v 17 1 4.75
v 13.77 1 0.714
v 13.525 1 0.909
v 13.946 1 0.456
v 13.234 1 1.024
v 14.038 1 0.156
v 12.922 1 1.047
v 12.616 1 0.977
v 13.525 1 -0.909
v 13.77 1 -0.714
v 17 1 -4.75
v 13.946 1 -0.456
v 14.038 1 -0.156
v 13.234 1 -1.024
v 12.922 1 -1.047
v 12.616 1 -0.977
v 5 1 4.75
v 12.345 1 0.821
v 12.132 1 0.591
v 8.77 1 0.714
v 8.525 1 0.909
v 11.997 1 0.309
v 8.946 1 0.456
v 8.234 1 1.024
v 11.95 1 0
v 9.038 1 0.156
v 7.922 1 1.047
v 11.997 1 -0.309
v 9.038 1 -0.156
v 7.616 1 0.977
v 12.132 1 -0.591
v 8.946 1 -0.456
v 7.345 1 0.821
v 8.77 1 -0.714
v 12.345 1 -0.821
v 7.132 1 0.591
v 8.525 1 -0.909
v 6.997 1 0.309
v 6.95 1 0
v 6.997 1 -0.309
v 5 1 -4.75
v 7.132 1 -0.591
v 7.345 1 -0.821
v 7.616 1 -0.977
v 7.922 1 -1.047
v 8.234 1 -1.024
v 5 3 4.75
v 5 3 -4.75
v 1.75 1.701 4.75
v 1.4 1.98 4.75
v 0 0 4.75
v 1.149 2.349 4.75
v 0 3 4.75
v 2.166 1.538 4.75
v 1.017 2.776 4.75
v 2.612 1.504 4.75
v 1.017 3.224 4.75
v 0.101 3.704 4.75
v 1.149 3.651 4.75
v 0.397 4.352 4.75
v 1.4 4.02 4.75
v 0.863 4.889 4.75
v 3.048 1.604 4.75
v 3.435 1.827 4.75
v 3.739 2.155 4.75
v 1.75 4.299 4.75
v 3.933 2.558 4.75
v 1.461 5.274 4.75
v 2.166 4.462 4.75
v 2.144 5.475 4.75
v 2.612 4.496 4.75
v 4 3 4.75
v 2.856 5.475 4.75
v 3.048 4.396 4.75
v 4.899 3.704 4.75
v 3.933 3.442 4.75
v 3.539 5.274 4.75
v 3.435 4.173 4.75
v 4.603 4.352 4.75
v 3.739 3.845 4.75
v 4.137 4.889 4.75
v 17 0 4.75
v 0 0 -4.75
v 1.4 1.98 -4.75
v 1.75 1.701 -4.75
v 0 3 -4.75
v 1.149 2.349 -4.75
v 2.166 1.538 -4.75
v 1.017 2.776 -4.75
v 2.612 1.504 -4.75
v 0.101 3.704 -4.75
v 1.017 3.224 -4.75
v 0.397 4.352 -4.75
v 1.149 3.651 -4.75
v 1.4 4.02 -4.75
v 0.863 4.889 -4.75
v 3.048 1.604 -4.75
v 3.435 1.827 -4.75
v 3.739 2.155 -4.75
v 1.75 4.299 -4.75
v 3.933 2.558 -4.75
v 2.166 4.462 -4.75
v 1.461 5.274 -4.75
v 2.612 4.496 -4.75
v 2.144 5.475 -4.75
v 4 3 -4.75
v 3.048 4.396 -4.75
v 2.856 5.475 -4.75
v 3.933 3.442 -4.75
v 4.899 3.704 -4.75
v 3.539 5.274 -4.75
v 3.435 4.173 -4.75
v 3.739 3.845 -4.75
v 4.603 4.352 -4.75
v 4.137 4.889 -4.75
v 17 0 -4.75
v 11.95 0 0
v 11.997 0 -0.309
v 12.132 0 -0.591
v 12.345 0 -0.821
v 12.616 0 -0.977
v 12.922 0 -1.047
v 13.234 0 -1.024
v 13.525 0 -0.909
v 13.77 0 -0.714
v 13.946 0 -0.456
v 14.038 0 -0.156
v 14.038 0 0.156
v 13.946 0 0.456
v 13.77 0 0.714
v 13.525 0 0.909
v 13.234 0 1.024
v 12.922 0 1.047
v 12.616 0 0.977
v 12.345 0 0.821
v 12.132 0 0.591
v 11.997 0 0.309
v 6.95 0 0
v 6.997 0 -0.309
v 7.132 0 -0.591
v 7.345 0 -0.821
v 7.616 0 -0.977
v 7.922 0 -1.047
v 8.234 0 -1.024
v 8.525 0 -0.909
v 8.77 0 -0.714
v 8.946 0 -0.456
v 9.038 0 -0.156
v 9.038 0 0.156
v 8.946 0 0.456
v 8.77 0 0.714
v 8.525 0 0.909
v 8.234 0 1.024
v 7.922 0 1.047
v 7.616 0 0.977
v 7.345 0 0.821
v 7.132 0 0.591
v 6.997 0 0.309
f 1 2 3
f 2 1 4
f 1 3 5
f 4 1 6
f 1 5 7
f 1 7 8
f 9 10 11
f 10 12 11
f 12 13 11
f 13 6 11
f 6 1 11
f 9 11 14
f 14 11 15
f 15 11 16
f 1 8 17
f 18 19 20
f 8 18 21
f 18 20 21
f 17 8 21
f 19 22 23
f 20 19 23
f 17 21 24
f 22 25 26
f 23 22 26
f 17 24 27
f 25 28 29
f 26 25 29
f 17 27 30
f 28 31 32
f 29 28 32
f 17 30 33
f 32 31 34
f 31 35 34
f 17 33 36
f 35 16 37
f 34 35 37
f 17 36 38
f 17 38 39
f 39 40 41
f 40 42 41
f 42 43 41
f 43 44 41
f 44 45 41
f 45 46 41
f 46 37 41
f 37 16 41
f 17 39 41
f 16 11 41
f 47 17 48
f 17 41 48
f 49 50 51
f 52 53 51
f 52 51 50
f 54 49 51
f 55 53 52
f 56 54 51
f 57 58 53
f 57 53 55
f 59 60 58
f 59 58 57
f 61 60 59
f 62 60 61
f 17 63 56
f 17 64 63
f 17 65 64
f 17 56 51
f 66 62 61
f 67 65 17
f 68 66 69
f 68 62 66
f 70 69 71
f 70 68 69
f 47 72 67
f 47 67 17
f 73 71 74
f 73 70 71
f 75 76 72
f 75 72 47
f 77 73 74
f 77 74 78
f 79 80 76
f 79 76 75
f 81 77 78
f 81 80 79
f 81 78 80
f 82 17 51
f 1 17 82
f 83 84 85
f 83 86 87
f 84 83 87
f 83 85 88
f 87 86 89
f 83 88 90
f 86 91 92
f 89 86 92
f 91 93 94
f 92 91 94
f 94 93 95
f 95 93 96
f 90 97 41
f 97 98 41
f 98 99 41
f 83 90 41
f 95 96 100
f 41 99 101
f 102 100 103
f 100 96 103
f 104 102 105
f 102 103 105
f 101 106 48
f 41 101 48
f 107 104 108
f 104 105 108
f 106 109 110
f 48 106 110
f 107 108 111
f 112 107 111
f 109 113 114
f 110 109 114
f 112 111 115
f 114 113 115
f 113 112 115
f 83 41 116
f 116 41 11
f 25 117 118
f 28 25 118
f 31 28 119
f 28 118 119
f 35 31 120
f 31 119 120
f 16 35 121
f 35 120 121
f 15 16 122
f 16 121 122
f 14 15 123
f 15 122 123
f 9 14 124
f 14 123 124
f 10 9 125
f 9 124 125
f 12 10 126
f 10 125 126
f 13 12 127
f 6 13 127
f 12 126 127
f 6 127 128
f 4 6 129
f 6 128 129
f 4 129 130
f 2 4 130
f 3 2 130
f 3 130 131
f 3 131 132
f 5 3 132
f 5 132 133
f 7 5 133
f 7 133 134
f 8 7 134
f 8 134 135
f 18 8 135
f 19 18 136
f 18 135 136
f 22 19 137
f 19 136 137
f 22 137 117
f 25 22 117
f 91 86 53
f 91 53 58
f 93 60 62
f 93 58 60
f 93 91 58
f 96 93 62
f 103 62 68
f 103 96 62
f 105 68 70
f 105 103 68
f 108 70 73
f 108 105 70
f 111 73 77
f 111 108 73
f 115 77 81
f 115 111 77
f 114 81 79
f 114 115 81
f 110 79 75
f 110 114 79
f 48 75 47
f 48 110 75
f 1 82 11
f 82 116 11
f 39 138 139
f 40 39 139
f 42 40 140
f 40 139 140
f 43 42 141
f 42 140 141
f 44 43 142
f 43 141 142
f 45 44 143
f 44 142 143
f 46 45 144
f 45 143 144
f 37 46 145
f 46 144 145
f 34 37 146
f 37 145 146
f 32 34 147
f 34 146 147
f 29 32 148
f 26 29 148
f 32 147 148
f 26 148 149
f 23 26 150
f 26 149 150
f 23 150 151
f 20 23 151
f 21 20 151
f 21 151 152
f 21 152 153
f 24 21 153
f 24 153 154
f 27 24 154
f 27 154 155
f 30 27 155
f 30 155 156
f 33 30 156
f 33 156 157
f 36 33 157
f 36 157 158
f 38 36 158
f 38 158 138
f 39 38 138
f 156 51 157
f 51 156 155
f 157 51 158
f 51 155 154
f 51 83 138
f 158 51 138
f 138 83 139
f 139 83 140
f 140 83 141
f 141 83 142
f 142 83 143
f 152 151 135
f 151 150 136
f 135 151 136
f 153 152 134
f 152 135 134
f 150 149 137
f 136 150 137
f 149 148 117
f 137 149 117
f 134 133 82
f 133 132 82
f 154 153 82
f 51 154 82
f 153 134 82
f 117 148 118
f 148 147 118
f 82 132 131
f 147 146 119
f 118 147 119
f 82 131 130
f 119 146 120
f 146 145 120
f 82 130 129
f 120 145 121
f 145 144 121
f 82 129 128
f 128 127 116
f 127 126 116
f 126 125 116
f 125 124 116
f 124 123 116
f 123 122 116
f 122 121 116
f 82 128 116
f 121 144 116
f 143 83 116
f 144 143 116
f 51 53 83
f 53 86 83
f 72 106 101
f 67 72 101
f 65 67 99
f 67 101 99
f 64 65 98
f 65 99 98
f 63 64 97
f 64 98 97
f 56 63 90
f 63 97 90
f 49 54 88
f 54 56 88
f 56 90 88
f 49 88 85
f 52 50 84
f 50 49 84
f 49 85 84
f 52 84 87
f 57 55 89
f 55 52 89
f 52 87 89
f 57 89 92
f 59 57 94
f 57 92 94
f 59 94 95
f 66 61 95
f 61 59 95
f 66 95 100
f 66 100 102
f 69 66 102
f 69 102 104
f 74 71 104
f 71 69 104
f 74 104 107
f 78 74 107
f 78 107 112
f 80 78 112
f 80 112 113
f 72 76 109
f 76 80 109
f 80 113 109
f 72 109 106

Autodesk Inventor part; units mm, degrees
sketch "Sketch_1" plane through (0, 0, 0) normal (0, 0, 1) x (1, 0, 0)
  line L0 (0, 3) -> (0, 0)
  line L1 (0, 0) -> (17, 0)
  line L2 (17, 0) -> (17, 1)
  line L3 (17, 1) -> (5, 1)
  line L4 (5, 1) -> (5, 3)
  arc A0 (5, 3) -> (0, 3) centre (2.5, 3) ccw
  circle A1 centre (2.5, 3) radius 1.5
extrude "Extrusion1" add sketch "Sketch_1" along normal mid plane 9.5
sketch "Sketch_2" plane through (0, 0, 0) normal (0, 1, 0) x (-1, 0, 0)
  circle A0 centre (-8, 0) radius 1.05
extrude "Extrusion2" cut sketch "Sketch_2" along normal mid plane 9.5
sketch "Sketch_3" plane through (0, 0, 0) normal (0, 1, 0) x (-1, 0, 0)
  circle A0 centre (-13, 0) radius 1.05
extrude "Extrusion3" cut sketch "Sketch_3" along normal mid plane 9.5
ref_plane "A_XY" through (2.5, 3, 0) normal (0, 0, 1) x (1, 0, 0)
ref_plane "A_YZ" through (2.5, 3, 0) normal (1, 0, 0) x (0, 1, 0)
ref_plane "A_ZX" through (2.5, 3, 0) normal (0, 1, 0) x (0, 0, 1)
properties part number "PKWS1_b"
